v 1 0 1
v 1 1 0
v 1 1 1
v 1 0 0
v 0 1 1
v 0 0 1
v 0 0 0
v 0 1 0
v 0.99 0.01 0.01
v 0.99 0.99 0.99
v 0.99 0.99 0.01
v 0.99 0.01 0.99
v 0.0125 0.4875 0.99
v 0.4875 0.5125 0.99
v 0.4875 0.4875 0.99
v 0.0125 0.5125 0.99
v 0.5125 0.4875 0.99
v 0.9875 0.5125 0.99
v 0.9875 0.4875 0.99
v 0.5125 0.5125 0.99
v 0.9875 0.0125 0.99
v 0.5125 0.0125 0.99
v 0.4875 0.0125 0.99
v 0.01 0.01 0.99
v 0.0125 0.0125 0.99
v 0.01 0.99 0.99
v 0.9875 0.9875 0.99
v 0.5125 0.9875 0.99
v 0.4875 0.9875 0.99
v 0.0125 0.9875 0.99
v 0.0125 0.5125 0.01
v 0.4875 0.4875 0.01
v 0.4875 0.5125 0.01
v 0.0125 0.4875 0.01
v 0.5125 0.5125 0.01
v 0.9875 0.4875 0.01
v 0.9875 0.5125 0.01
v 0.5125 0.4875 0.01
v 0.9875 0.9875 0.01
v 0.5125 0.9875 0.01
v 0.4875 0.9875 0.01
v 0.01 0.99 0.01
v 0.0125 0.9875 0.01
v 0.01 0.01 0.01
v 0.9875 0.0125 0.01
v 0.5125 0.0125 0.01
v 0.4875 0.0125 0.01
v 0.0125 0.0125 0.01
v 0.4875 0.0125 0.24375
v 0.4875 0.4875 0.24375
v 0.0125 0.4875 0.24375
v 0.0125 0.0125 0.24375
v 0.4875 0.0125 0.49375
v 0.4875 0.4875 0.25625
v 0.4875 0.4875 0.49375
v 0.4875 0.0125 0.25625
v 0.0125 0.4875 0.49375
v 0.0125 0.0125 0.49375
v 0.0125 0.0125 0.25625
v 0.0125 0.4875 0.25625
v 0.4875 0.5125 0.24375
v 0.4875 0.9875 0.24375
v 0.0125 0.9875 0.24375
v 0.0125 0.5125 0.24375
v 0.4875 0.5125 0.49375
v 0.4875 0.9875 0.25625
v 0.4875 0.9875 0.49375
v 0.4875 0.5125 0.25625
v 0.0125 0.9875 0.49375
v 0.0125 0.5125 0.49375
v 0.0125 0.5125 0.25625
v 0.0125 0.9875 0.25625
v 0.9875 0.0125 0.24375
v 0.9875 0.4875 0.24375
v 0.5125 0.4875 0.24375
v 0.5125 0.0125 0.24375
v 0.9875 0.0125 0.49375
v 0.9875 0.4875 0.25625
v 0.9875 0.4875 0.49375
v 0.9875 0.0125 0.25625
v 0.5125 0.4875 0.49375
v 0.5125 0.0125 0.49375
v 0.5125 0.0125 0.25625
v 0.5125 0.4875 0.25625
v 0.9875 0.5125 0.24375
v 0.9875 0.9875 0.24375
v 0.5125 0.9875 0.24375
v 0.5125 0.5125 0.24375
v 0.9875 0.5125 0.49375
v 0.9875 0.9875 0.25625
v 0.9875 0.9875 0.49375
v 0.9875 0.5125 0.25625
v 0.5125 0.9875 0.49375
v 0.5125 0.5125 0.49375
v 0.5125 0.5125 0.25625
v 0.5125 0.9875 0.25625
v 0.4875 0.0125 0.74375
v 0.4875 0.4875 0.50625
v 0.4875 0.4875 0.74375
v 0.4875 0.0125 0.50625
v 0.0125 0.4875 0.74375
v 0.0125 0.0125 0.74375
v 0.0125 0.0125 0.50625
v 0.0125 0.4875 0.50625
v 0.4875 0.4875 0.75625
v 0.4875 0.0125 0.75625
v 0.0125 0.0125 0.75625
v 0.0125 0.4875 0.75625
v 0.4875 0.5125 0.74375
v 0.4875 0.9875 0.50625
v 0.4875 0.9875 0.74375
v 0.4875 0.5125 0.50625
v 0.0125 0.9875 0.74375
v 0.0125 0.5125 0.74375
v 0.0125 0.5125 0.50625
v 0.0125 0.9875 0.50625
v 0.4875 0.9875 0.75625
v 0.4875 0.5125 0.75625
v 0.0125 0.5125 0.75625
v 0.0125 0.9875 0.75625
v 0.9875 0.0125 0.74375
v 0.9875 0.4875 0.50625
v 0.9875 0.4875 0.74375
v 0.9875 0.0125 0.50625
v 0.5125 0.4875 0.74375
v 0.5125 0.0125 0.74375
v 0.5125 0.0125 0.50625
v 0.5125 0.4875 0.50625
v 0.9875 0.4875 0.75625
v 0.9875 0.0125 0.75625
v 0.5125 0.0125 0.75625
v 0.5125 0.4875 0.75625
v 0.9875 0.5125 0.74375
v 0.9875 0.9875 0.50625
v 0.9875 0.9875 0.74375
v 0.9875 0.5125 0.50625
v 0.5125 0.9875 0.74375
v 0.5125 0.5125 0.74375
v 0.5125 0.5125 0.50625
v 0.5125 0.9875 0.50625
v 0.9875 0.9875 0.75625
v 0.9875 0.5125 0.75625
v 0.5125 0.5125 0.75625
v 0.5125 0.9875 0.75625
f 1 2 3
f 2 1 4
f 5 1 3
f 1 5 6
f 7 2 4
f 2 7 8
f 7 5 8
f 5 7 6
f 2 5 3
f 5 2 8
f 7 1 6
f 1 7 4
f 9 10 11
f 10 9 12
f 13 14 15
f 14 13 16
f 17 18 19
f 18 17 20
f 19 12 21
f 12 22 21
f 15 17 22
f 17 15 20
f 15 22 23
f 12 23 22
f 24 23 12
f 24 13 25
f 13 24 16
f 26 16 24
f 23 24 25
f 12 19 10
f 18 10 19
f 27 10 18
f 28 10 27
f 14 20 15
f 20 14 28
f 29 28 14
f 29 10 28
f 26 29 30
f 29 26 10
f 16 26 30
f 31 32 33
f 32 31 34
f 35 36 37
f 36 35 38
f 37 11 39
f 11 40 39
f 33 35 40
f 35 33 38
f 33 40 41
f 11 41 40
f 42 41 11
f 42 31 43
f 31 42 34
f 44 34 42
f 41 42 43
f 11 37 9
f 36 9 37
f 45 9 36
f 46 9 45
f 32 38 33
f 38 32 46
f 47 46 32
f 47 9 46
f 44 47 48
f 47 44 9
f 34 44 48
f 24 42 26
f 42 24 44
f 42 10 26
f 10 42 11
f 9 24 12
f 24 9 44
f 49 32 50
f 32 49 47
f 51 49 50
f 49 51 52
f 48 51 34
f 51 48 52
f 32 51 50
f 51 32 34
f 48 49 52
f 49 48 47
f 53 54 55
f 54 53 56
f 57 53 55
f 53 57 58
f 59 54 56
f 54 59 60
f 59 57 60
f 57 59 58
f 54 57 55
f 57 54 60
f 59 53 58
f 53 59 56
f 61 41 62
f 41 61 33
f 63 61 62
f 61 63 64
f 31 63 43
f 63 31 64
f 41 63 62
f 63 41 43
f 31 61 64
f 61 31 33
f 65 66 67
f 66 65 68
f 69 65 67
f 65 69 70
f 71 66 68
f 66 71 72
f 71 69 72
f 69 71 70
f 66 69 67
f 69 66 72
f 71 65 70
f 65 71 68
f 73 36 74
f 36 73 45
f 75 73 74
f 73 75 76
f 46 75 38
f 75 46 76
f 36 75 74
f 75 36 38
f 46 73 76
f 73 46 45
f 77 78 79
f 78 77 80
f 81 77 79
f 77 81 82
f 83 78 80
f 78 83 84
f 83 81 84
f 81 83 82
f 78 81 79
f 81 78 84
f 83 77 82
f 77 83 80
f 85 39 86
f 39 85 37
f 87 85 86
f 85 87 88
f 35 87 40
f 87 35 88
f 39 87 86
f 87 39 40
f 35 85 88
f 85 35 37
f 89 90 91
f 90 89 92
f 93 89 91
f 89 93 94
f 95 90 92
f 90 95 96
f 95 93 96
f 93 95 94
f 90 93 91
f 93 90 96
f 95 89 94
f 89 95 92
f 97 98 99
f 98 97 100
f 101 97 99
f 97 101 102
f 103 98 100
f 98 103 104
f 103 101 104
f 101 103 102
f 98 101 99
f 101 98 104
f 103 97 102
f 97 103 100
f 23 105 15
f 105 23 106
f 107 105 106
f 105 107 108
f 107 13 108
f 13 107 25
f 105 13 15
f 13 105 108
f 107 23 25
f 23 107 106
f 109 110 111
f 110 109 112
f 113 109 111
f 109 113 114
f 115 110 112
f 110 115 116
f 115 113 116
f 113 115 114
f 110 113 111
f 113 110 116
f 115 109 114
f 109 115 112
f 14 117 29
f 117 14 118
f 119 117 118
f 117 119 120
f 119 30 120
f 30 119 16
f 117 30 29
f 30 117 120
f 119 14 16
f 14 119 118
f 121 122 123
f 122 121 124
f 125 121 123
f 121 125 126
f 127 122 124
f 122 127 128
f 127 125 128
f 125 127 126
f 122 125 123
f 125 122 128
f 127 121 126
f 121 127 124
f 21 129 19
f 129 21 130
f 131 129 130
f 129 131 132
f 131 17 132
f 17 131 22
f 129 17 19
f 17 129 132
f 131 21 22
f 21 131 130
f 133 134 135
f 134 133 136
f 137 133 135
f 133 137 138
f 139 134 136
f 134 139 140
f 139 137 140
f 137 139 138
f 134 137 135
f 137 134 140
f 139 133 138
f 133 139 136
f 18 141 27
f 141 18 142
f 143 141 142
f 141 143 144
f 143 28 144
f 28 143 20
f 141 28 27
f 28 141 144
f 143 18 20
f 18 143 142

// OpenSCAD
translate([0.25, 0.25, 0.125]) color([0.18861772816501654, 0.2995636798725818, 0.6373620141013281]) cube([0.475, 0.475, 0.2375], center=true);
translate([0.25, 0.25, 0.375]) color([0.4415437475553168, 0.7961450490178668, 0.84634125377522]) cube([0.475, 0.475, 0.2375], center=true);
translate([0.25, 0.75, 0.125]) color([0.8916592015510378, 0.14182509993947134, 0.48137274701024935]) cube([0.475, 0.475, 0.2375], center=true);
translate([0.25, 0.75, 0.375]) color([0.5064966308665176, 0.3611716642845566, 0.4929690929227817]) cube([0.475, 0.475, 0.2375], center=true);
translate([0.75, 0.25, 0.125]) color([0.33975835656900355, 0.19140748203007008, 0.9037004397118625]) cube([0.475, 0.475, 0.2375], center=true);
translate([0.75, 0.25, 0.375]) color([0.22105114979588647, 0.7119011916453704, 0.13344329368444563]) cube([0.475, 0.475, 0.2375], center=true);
translate([0.75, 0.75, 0.125]) color([0.4275590222113661, 0.9470347016445155, 0.3426119792791571]) cube([0.475, 0.475, 0.2375], center=true);
translate([0.75, 0.75, 0.375]) color([0.3987605823857824, 0.04971247072134921, 0.27732972371438613]) cube([0.475, 0.475, 0.2375], center=true);
translate([0.25, 0.25, 0.625]) color([0.9851647718611997, 0.6384503739598667, 0.3871269652437943]) cube([0.475, 0.475, 0.2375], center=true);
translate([0.25, 0.25, 0.875]) color([0.2616500206534439, 0.292388978519858, 0.6822268022305197]) cube([0.475, 0.475, 0.2375], center=true);
translate([0.25, 0.75, 0.625]) color([0.6793183354409675, 0.052800824167059335, 0.13687799840204007]) cube([0.475, 0.475, 0.2375], center=true);
translate([0.25, 0.75, 0.875]) color([0.7511961766341985, 0.08905517025934961, 0.8809844539432513]) cube([0.475, 0.475, 0.2375], center=true);
translate([0.75, 0.25, 0.625]) color([0.9000559978129854, 0.24961533485301535, 0.783578978277694]) cube([0.475, 0.475, 0.2375], center=true);
translate([0.75, 0.25, 0.875]) color([0.719170536719719, 0.7381890865001747, 0.8253608447106495]) cube([0.475, 0.475, 0.2375], center=true);
translate([0.75, 0.75, 0.625]) color([0.6617918474406483, 0.8800476441724, 0.35790415810623144]) cube([0.475, 0.475, 0.2375], center=true);
translate([0.75, 0.75, 0.875]) color([0.9363814172793983, 0.2462517128887105, 0.011644640876006584]) cube([0.475, 0.475, 0.2375], center=true);
color([0.3,0.3,0.3,0.3]) difference() { cube([1,1,1]); translate([0.01,0.01,0.01]) cube([0.98,0.98,0.98]); }
